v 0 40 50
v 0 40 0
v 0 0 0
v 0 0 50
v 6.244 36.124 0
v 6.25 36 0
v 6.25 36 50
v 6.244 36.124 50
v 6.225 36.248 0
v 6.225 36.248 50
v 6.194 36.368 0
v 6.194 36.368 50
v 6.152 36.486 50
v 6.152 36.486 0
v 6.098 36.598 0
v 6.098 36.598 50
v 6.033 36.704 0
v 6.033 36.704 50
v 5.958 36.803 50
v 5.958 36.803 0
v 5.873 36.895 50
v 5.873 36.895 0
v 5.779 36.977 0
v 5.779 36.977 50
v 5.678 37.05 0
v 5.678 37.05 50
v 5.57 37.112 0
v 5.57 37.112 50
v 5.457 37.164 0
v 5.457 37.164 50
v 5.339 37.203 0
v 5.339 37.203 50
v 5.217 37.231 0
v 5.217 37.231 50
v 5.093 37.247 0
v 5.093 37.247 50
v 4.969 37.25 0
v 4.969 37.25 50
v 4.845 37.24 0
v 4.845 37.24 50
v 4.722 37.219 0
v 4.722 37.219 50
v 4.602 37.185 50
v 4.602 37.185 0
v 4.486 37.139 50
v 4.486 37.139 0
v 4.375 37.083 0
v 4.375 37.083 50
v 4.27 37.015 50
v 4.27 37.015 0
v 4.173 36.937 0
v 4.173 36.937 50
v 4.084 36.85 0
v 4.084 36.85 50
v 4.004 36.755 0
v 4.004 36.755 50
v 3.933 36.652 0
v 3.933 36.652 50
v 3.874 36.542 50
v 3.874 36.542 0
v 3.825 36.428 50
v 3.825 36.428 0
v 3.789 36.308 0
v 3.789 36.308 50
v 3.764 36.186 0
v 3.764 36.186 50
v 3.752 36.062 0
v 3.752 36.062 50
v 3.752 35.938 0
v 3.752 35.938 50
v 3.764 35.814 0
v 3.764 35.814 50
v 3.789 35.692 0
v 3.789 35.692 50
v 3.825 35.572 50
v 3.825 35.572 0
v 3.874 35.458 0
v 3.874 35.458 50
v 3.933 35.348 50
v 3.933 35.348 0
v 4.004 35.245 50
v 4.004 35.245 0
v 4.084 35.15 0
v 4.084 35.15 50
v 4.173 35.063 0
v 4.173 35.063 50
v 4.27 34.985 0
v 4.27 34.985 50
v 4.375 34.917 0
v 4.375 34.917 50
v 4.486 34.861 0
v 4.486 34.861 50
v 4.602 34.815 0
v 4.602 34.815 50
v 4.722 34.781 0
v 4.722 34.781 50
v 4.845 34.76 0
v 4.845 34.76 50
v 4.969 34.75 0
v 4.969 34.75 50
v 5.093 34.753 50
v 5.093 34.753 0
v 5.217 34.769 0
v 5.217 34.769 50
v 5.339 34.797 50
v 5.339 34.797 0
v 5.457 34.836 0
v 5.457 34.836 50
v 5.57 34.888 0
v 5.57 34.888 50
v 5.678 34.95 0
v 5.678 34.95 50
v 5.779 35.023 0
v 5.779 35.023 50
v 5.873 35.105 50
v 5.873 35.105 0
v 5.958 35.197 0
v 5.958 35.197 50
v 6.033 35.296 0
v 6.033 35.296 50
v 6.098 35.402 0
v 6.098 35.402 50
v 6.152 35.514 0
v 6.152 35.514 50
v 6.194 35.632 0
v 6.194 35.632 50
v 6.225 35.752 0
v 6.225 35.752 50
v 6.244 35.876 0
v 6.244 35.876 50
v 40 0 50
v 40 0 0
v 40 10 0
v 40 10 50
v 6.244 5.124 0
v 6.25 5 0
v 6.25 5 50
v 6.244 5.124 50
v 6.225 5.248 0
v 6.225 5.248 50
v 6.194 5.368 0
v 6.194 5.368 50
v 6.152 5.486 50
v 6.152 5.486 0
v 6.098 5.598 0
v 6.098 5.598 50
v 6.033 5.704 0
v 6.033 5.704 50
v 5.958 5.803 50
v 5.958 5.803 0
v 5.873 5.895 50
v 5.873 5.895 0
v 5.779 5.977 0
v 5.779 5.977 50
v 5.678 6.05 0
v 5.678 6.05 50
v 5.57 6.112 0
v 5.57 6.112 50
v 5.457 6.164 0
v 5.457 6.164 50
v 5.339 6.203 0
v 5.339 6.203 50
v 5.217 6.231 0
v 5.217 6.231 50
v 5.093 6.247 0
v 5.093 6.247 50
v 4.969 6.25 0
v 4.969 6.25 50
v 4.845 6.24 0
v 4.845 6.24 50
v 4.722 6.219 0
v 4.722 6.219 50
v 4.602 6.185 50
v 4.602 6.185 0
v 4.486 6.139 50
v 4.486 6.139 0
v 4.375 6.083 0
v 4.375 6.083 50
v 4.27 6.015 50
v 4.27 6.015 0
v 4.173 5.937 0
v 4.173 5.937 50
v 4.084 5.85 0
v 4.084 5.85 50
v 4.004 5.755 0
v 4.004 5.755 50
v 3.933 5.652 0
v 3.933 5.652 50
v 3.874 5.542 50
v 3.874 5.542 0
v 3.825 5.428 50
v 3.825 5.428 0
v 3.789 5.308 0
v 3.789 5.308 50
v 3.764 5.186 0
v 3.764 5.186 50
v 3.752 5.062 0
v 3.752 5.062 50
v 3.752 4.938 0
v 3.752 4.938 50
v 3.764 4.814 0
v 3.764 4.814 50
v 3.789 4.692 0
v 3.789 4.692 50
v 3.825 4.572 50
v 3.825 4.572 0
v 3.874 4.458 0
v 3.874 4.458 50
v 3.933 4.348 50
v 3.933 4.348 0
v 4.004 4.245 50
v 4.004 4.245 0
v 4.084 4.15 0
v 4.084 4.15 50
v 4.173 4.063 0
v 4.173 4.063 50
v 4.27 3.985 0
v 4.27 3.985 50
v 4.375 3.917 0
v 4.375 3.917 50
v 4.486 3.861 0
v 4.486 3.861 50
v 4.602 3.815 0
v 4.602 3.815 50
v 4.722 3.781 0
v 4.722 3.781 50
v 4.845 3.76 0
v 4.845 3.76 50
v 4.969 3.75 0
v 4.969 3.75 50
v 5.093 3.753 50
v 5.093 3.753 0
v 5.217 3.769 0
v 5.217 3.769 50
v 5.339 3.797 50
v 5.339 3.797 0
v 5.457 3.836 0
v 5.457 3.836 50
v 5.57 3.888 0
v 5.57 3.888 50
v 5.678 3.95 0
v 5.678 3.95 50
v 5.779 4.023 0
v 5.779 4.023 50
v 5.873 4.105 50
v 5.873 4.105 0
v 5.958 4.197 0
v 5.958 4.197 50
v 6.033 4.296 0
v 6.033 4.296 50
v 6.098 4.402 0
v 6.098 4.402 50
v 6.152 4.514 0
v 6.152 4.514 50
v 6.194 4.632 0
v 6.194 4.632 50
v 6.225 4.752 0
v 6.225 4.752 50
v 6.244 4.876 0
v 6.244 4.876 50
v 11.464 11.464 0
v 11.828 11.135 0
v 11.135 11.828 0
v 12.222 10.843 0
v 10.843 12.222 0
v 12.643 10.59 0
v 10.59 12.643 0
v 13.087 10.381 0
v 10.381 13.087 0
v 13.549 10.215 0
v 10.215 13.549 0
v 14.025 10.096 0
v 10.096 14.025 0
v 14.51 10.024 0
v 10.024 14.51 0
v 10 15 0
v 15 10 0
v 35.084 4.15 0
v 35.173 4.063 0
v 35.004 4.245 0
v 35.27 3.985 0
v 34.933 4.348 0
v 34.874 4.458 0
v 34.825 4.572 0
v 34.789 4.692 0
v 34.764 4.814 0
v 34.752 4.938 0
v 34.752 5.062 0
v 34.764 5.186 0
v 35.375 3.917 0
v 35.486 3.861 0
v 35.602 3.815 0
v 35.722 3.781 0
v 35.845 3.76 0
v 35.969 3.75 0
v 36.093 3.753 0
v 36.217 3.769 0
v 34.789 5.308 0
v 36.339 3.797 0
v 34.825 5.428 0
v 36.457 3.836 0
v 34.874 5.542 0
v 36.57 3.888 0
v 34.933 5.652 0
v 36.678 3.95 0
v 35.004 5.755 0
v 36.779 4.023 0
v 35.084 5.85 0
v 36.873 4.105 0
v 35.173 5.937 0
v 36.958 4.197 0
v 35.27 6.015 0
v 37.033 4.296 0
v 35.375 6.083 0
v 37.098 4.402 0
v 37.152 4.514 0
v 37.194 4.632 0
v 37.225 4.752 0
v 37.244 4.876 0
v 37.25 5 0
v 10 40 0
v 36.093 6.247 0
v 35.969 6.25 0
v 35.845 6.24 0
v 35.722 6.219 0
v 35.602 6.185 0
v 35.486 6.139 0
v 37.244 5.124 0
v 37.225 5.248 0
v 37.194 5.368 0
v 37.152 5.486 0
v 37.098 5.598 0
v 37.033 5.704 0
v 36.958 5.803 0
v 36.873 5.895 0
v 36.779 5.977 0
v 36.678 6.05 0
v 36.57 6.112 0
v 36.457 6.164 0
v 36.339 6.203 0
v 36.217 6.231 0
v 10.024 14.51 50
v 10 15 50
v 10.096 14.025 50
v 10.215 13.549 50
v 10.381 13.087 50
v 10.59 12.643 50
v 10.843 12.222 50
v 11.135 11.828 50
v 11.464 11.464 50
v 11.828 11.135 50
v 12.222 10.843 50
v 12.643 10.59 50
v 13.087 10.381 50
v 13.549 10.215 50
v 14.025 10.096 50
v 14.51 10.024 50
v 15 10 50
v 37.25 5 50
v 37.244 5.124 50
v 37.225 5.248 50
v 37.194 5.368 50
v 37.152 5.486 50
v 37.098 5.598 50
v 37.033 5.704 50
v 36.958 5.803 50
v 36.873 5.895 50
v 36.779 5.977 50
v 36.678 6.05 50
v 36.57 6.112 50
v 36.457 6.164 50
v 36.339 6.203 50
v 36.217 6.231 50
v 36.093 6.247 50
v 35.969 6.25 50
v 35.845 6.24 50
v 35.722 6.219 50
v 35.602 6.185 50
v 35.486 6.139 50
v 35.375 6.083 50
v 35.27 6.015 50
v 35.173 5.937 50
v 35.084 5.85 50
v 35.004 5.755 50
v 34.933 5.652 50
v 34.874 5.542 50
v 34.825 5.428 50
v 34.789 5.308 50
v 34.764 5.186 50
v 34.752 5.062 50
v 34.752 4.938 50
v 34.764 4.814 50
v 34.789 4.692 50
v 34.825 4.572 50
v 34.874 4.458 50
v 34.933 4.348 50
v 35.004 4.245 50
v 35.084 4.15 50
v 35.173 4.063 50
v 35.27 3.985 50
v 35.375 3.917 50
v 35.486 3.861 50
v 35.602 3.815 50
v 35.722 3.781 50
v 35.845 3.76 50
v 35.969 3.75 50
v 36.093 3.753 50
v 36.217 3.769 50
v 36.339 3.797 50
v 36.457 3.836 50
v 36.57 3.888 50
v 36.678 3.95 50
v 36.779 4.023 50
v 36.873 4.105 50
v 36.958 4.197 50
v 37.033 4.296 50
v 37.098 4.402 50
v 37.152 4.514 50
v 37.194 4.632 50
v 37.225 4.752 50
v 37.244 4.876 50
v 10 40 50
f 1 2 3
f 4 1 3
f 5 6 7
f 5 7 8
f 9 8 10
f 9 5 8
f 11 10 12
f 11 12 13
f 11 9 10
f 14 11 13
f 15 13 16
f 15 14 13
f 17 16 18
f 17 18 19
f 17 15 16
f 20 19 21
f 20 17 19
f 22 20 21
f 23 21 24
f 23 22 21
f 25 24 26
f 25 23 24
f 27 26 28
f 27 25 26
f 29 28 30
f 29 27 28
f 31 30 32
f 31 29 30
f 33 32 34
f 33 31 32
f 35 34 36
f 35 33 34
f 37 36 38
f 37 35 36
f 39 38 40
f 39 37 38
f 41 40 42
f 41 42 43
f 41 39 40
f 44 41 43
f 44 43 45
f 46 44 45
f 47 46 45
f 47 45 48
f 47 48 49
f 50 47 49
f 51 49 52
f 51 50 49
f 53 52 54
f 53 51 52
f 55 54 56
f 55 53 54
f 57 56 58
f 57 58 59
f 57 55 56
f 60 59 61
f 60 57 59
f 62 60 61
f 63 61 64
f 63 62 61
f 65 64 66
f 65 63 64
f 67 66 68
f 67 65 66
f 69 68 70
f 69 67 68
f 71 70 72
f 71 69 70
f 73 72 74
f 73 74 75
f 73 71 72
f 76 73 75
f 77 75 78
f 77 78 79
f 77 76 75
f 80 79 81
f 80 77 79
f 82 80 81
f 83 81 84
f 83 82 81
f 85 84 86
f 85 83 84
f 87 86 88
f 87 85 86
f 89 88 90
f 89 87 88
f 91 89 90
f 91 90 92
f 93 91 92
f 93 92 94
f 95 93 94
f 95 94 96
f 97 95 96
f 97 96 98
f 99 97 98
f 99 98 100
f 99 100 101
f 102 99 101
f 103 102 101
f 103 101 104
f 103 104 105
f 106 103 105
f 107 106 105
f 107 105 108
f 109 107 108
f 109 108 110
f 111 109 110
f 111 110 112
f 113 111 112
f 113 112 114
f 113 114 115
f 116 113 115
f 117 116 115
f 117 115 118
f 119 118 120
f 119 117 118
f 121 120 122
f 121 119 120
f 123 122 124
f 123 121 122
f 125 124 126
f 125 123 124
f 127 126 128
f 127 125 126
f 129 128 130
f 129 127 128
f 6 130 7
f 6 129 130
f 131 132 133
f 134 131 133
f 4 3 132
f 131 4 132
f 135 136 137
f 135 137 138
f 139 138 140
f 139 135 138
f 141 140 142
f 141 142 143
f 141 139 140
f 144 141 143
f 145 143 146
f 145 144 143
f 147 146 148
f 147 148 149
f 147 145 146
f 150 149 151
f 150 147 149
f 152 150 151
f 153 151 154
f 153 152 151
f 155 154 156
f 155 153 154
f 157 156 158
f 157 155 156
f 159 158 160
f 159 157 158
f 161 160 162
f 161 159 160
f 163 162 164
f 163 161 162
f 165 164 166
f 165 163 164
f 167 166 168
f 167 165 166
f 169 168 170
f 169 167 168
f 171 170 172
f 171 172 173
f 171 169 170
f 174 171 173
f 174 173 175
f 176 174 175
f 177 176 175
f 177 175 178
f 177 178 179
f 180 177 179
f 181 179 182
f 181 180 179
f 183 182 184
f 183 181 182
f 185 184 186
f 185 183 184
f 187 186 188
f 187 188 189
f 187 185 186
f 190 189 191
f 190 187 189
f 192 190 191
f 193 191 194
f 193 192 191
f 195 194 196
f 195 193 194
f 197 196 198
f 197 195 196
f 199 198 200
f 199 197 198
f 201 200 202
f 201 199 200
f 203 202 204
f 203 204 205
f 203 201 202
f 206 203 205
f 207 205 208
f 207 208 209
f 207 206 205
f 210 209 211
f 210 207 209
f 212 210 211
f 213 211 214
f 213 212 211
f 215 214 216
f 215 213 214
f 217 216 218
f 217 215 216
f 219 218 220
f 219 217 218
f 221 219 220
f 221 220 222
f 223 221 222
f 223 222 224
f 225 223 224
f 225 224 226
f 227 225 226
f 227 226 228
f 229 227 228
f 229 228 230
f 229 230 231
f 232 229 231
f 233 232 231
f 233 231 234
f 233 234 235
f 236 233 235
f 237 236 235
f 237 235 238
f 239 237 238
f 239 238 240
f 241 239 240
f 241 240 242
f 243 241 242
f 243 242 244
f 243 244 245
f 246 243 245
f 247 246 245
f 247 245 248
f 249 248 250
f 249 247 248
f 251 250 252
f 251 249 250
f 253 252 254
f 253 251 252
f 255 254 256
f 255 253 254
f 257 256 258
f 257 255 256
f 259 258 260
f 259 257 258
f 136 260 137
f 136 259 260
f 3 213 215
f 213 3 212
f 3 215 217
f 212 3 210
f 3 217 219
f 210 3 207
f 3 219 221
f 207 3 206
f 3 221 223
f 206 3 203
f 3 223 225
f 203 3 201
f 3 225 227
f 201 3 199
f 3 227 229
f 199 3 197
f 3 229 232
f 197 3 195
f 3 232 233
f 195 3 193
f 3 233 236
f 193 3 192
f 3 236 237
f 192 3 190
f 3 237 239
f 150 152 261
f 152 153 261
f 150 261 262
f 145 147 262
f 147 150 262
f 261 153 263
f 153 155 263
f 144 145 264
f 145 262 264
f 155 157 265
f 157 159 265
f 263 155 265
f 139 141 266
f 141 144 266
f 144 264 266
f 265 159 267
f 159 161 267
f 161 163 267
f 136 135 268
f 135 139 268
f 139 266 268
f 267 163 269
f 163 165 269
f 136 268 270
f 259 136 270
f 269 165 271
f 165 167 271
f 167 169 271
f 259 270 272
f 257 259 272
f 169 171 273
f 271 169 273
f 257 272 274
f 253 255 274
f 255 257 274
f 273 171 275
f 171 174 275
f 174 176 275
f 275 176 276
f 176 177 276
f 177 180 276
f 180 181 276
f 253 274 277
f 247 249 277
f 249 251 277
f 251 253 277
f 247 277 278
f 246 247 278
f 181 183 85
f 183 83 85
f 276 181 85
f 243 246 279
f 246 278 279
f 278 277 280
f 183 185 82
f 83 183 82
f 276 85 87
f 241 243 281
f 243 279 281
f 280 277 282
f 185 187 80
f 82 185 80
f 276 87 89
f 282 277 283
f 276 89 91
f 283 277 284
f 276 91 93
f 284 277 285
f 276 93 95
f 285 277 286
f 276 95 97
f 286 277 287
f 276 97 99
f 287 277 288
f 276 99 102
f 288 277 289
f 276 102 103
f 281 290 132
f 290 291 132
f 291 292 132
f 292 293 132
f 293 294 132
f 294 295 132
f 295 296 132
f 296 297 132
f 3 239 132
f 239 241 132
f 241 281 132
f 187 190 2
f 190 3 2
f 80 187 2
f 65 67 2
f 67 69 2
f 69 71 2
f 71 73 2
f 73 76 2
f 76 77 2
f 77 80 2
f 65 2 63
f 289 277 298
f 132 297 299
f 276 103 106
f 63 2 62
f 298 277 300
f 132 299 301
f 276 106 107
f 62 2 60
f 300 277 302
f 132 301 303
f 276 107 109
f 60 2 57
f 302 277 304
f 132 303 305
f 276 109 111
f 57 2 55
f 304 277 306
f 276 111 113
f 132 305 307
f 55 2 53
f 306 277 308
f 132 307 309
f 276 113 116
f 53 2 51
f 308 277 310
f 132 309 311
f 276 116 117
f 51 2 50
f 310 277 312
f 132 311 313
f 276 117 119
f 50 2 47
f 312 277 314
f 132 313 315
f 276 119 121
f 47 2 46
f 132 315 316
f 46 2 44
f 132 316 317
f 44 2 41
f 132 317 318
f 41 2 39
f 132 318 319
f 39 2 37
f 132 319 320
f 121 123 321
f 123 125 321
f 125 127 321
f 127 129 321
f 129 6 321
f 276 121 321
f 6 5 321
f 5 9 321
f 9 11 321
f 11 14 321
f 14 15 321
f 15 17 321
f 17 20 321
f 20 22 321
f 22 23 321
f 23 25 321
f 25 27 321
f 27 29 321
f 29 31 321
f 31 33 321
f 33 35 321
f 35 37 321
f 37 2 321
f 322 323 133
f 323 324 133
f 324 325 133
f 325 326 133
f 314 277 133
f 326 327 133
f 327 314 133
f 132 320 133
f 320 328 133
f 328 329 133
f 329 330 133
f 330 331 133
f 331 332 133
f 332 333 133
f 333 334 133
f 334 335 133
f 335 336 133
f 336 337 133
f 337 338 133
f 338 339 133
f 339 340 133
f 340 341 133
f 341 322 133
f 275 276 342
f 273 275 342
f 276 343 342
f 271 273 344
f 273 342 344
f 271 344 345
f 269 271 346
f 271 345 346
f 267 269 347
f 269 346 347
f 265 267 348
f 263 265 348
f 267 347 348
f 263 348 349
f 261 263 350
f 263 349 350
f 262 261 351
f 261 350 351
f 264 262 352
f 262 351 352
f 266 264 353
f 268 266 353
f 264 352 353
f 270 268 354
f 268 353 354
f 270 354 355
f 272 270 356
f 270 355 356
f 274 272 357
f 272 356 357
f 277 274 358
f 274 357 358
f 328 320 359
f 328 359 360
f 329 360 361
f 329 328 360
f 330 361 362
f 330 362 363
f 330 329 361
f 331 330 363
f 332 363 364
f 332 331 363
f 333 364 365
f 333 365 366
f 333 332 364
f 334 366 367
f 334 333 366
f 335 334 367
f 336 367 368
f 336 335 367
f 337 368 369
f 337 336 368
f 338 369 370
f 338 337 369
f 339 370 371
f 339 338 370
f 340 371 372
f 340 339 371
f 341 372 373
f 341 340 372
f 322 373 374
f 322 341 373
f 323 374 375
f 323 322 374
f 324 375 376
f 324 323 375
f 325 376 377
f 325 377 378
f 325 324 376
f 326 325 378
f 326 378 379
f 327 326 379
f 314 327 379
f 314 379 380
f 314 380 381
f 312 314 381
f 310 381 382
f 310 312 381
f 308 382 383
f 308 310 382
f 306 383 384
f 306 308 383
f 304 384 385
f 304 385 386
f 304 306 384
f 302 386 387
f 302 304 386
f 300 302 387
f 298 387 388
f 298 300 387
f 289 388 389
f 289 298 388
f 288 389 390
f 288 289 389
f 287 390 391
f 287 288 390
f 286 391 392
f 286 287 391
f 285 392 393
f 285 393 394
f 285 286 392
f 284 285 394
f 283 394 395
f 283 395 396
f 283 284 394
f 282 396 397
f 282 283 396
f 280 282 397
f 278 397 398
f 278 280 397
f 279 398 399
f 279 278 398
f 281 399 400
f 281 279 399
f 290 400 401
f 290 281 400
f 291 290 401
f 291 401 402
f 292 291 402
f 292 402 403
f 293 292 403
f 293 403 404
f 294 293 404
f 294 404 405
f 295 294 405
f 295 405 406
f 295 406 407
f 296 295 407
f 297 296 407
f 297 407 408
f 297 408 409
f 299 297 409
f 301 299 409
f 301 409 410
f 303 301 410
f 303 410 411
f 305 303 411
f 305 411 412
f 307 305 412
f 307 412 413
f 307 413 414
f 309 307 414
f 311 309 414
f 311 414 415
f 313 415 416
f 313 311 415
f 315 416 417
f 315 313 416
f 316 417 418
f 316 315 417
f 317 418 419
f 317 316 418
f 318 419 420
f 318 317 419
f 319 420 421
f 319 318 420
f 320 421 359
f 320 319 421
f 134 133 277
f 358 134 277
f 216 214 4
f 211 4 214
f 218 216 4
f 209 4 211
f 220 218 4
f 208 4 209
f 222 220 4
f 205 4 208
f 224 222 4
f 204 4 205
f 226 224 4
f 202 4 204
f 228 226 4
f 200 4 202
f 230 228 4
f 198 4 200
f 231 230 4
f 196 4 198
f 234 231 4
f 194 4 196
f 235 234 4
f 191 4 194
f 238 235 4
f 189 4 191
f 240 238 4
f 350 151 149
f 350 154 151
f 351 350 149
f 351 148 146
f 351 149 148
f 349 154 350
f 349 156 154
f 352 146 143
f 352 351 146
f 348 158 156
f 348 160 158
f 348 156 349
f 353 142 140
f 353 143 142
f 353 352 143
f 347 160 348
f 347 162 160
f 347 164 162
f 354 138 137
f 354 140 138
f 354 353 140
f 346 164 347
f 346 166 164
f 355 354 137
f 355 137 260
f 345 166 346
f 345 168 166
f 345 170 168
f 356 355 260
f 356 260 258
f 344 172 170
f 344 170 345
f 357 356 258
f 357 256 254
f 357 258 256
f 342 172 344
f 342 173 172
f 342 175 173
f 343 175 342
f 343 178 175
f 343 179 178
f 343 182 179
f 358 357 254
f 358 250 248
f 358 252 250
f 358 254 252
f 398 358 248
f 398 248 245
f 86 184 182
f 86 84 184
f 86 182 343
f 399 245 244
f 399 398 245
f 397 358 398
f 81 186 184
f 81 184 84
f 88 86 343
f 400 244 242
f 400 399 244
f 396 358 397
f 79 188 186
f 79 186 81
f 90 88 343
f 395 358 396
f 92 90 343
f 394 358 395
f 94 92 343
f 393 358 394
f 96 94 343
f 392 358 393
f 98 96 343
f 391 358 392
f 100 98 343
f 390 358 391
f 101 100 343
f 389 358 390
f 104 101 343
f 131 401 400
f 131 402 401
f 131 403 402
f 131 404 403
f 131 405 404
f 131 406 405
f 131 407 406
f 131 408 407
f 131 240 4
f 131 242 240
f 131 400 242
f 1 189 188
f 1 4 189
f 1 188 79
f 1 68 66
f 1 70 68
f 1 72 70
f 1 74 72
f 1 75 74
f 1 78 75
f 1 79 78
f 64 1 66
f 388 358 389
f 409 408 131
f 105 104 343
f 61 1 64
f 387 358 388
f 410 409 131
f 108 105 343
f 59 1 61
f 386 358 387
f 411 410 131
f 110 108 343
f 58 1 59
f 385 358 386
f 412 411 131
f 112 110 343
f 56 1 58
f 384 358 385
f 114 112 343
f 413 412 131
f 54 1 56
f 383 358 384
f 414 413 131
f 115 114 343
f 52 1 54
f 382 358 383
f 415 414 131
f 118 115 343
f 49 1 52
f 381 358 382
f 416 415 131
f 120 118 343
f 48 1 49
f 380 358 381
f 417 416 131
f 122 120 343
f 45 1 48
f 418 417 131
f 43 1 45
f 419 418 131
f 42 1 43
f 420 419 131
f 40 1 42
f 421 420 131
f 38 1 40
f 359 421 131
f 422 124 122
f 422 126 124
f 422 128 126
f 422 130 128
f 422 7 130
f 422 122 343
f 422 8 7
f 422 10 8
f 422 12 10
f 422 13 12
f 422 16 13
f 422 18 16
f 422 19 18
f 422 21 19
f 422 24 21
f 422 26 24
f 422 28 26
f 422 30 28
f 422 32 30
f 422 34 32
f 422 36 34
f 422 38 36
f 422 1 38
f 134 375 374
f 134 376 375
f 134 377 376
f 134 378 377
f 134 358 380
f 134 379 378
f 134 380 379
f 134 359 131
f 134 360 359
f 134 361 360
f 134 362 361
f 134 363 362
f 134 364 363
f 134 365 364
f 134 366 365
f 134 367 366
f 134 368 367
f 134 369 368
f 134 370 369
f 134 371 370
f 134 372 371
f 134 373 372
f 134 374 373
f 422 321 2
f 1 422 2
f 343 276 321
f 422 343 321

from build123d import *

# Parameters (mm, degrees)
F0_R     = 1.25
F1_DEPTH = 50
F2_R     = 5


with BuildPart() as f1:
    # F0 (on Top) → F1 (new body)
    with BuildSketch(Plane.XY):
        Polygon((10, 40), (0, 40), (0, 0), (40, 0), (40, 10), (10, 10), align=None)
        with Locations((5, 5)):
            Circle(F0_R, mode=Mode.SUBTRACT)
        with Locations((36, 5)):
            Circle(F0_R, mode=Mode.SUBTRACT)
        with Locations((5, 36)):
            Circle(F0_R, mode=Mode.SUBTRACT)
    extrude(amount=F1_DEPTH)

    # F2
    f2_edges = [f1.edges().sort_by_distance(p)[0] for p in [
        (10, 10, 25),
    ]]
    fillet(f2_edges, radius=F2_R)


solid = f1.part
